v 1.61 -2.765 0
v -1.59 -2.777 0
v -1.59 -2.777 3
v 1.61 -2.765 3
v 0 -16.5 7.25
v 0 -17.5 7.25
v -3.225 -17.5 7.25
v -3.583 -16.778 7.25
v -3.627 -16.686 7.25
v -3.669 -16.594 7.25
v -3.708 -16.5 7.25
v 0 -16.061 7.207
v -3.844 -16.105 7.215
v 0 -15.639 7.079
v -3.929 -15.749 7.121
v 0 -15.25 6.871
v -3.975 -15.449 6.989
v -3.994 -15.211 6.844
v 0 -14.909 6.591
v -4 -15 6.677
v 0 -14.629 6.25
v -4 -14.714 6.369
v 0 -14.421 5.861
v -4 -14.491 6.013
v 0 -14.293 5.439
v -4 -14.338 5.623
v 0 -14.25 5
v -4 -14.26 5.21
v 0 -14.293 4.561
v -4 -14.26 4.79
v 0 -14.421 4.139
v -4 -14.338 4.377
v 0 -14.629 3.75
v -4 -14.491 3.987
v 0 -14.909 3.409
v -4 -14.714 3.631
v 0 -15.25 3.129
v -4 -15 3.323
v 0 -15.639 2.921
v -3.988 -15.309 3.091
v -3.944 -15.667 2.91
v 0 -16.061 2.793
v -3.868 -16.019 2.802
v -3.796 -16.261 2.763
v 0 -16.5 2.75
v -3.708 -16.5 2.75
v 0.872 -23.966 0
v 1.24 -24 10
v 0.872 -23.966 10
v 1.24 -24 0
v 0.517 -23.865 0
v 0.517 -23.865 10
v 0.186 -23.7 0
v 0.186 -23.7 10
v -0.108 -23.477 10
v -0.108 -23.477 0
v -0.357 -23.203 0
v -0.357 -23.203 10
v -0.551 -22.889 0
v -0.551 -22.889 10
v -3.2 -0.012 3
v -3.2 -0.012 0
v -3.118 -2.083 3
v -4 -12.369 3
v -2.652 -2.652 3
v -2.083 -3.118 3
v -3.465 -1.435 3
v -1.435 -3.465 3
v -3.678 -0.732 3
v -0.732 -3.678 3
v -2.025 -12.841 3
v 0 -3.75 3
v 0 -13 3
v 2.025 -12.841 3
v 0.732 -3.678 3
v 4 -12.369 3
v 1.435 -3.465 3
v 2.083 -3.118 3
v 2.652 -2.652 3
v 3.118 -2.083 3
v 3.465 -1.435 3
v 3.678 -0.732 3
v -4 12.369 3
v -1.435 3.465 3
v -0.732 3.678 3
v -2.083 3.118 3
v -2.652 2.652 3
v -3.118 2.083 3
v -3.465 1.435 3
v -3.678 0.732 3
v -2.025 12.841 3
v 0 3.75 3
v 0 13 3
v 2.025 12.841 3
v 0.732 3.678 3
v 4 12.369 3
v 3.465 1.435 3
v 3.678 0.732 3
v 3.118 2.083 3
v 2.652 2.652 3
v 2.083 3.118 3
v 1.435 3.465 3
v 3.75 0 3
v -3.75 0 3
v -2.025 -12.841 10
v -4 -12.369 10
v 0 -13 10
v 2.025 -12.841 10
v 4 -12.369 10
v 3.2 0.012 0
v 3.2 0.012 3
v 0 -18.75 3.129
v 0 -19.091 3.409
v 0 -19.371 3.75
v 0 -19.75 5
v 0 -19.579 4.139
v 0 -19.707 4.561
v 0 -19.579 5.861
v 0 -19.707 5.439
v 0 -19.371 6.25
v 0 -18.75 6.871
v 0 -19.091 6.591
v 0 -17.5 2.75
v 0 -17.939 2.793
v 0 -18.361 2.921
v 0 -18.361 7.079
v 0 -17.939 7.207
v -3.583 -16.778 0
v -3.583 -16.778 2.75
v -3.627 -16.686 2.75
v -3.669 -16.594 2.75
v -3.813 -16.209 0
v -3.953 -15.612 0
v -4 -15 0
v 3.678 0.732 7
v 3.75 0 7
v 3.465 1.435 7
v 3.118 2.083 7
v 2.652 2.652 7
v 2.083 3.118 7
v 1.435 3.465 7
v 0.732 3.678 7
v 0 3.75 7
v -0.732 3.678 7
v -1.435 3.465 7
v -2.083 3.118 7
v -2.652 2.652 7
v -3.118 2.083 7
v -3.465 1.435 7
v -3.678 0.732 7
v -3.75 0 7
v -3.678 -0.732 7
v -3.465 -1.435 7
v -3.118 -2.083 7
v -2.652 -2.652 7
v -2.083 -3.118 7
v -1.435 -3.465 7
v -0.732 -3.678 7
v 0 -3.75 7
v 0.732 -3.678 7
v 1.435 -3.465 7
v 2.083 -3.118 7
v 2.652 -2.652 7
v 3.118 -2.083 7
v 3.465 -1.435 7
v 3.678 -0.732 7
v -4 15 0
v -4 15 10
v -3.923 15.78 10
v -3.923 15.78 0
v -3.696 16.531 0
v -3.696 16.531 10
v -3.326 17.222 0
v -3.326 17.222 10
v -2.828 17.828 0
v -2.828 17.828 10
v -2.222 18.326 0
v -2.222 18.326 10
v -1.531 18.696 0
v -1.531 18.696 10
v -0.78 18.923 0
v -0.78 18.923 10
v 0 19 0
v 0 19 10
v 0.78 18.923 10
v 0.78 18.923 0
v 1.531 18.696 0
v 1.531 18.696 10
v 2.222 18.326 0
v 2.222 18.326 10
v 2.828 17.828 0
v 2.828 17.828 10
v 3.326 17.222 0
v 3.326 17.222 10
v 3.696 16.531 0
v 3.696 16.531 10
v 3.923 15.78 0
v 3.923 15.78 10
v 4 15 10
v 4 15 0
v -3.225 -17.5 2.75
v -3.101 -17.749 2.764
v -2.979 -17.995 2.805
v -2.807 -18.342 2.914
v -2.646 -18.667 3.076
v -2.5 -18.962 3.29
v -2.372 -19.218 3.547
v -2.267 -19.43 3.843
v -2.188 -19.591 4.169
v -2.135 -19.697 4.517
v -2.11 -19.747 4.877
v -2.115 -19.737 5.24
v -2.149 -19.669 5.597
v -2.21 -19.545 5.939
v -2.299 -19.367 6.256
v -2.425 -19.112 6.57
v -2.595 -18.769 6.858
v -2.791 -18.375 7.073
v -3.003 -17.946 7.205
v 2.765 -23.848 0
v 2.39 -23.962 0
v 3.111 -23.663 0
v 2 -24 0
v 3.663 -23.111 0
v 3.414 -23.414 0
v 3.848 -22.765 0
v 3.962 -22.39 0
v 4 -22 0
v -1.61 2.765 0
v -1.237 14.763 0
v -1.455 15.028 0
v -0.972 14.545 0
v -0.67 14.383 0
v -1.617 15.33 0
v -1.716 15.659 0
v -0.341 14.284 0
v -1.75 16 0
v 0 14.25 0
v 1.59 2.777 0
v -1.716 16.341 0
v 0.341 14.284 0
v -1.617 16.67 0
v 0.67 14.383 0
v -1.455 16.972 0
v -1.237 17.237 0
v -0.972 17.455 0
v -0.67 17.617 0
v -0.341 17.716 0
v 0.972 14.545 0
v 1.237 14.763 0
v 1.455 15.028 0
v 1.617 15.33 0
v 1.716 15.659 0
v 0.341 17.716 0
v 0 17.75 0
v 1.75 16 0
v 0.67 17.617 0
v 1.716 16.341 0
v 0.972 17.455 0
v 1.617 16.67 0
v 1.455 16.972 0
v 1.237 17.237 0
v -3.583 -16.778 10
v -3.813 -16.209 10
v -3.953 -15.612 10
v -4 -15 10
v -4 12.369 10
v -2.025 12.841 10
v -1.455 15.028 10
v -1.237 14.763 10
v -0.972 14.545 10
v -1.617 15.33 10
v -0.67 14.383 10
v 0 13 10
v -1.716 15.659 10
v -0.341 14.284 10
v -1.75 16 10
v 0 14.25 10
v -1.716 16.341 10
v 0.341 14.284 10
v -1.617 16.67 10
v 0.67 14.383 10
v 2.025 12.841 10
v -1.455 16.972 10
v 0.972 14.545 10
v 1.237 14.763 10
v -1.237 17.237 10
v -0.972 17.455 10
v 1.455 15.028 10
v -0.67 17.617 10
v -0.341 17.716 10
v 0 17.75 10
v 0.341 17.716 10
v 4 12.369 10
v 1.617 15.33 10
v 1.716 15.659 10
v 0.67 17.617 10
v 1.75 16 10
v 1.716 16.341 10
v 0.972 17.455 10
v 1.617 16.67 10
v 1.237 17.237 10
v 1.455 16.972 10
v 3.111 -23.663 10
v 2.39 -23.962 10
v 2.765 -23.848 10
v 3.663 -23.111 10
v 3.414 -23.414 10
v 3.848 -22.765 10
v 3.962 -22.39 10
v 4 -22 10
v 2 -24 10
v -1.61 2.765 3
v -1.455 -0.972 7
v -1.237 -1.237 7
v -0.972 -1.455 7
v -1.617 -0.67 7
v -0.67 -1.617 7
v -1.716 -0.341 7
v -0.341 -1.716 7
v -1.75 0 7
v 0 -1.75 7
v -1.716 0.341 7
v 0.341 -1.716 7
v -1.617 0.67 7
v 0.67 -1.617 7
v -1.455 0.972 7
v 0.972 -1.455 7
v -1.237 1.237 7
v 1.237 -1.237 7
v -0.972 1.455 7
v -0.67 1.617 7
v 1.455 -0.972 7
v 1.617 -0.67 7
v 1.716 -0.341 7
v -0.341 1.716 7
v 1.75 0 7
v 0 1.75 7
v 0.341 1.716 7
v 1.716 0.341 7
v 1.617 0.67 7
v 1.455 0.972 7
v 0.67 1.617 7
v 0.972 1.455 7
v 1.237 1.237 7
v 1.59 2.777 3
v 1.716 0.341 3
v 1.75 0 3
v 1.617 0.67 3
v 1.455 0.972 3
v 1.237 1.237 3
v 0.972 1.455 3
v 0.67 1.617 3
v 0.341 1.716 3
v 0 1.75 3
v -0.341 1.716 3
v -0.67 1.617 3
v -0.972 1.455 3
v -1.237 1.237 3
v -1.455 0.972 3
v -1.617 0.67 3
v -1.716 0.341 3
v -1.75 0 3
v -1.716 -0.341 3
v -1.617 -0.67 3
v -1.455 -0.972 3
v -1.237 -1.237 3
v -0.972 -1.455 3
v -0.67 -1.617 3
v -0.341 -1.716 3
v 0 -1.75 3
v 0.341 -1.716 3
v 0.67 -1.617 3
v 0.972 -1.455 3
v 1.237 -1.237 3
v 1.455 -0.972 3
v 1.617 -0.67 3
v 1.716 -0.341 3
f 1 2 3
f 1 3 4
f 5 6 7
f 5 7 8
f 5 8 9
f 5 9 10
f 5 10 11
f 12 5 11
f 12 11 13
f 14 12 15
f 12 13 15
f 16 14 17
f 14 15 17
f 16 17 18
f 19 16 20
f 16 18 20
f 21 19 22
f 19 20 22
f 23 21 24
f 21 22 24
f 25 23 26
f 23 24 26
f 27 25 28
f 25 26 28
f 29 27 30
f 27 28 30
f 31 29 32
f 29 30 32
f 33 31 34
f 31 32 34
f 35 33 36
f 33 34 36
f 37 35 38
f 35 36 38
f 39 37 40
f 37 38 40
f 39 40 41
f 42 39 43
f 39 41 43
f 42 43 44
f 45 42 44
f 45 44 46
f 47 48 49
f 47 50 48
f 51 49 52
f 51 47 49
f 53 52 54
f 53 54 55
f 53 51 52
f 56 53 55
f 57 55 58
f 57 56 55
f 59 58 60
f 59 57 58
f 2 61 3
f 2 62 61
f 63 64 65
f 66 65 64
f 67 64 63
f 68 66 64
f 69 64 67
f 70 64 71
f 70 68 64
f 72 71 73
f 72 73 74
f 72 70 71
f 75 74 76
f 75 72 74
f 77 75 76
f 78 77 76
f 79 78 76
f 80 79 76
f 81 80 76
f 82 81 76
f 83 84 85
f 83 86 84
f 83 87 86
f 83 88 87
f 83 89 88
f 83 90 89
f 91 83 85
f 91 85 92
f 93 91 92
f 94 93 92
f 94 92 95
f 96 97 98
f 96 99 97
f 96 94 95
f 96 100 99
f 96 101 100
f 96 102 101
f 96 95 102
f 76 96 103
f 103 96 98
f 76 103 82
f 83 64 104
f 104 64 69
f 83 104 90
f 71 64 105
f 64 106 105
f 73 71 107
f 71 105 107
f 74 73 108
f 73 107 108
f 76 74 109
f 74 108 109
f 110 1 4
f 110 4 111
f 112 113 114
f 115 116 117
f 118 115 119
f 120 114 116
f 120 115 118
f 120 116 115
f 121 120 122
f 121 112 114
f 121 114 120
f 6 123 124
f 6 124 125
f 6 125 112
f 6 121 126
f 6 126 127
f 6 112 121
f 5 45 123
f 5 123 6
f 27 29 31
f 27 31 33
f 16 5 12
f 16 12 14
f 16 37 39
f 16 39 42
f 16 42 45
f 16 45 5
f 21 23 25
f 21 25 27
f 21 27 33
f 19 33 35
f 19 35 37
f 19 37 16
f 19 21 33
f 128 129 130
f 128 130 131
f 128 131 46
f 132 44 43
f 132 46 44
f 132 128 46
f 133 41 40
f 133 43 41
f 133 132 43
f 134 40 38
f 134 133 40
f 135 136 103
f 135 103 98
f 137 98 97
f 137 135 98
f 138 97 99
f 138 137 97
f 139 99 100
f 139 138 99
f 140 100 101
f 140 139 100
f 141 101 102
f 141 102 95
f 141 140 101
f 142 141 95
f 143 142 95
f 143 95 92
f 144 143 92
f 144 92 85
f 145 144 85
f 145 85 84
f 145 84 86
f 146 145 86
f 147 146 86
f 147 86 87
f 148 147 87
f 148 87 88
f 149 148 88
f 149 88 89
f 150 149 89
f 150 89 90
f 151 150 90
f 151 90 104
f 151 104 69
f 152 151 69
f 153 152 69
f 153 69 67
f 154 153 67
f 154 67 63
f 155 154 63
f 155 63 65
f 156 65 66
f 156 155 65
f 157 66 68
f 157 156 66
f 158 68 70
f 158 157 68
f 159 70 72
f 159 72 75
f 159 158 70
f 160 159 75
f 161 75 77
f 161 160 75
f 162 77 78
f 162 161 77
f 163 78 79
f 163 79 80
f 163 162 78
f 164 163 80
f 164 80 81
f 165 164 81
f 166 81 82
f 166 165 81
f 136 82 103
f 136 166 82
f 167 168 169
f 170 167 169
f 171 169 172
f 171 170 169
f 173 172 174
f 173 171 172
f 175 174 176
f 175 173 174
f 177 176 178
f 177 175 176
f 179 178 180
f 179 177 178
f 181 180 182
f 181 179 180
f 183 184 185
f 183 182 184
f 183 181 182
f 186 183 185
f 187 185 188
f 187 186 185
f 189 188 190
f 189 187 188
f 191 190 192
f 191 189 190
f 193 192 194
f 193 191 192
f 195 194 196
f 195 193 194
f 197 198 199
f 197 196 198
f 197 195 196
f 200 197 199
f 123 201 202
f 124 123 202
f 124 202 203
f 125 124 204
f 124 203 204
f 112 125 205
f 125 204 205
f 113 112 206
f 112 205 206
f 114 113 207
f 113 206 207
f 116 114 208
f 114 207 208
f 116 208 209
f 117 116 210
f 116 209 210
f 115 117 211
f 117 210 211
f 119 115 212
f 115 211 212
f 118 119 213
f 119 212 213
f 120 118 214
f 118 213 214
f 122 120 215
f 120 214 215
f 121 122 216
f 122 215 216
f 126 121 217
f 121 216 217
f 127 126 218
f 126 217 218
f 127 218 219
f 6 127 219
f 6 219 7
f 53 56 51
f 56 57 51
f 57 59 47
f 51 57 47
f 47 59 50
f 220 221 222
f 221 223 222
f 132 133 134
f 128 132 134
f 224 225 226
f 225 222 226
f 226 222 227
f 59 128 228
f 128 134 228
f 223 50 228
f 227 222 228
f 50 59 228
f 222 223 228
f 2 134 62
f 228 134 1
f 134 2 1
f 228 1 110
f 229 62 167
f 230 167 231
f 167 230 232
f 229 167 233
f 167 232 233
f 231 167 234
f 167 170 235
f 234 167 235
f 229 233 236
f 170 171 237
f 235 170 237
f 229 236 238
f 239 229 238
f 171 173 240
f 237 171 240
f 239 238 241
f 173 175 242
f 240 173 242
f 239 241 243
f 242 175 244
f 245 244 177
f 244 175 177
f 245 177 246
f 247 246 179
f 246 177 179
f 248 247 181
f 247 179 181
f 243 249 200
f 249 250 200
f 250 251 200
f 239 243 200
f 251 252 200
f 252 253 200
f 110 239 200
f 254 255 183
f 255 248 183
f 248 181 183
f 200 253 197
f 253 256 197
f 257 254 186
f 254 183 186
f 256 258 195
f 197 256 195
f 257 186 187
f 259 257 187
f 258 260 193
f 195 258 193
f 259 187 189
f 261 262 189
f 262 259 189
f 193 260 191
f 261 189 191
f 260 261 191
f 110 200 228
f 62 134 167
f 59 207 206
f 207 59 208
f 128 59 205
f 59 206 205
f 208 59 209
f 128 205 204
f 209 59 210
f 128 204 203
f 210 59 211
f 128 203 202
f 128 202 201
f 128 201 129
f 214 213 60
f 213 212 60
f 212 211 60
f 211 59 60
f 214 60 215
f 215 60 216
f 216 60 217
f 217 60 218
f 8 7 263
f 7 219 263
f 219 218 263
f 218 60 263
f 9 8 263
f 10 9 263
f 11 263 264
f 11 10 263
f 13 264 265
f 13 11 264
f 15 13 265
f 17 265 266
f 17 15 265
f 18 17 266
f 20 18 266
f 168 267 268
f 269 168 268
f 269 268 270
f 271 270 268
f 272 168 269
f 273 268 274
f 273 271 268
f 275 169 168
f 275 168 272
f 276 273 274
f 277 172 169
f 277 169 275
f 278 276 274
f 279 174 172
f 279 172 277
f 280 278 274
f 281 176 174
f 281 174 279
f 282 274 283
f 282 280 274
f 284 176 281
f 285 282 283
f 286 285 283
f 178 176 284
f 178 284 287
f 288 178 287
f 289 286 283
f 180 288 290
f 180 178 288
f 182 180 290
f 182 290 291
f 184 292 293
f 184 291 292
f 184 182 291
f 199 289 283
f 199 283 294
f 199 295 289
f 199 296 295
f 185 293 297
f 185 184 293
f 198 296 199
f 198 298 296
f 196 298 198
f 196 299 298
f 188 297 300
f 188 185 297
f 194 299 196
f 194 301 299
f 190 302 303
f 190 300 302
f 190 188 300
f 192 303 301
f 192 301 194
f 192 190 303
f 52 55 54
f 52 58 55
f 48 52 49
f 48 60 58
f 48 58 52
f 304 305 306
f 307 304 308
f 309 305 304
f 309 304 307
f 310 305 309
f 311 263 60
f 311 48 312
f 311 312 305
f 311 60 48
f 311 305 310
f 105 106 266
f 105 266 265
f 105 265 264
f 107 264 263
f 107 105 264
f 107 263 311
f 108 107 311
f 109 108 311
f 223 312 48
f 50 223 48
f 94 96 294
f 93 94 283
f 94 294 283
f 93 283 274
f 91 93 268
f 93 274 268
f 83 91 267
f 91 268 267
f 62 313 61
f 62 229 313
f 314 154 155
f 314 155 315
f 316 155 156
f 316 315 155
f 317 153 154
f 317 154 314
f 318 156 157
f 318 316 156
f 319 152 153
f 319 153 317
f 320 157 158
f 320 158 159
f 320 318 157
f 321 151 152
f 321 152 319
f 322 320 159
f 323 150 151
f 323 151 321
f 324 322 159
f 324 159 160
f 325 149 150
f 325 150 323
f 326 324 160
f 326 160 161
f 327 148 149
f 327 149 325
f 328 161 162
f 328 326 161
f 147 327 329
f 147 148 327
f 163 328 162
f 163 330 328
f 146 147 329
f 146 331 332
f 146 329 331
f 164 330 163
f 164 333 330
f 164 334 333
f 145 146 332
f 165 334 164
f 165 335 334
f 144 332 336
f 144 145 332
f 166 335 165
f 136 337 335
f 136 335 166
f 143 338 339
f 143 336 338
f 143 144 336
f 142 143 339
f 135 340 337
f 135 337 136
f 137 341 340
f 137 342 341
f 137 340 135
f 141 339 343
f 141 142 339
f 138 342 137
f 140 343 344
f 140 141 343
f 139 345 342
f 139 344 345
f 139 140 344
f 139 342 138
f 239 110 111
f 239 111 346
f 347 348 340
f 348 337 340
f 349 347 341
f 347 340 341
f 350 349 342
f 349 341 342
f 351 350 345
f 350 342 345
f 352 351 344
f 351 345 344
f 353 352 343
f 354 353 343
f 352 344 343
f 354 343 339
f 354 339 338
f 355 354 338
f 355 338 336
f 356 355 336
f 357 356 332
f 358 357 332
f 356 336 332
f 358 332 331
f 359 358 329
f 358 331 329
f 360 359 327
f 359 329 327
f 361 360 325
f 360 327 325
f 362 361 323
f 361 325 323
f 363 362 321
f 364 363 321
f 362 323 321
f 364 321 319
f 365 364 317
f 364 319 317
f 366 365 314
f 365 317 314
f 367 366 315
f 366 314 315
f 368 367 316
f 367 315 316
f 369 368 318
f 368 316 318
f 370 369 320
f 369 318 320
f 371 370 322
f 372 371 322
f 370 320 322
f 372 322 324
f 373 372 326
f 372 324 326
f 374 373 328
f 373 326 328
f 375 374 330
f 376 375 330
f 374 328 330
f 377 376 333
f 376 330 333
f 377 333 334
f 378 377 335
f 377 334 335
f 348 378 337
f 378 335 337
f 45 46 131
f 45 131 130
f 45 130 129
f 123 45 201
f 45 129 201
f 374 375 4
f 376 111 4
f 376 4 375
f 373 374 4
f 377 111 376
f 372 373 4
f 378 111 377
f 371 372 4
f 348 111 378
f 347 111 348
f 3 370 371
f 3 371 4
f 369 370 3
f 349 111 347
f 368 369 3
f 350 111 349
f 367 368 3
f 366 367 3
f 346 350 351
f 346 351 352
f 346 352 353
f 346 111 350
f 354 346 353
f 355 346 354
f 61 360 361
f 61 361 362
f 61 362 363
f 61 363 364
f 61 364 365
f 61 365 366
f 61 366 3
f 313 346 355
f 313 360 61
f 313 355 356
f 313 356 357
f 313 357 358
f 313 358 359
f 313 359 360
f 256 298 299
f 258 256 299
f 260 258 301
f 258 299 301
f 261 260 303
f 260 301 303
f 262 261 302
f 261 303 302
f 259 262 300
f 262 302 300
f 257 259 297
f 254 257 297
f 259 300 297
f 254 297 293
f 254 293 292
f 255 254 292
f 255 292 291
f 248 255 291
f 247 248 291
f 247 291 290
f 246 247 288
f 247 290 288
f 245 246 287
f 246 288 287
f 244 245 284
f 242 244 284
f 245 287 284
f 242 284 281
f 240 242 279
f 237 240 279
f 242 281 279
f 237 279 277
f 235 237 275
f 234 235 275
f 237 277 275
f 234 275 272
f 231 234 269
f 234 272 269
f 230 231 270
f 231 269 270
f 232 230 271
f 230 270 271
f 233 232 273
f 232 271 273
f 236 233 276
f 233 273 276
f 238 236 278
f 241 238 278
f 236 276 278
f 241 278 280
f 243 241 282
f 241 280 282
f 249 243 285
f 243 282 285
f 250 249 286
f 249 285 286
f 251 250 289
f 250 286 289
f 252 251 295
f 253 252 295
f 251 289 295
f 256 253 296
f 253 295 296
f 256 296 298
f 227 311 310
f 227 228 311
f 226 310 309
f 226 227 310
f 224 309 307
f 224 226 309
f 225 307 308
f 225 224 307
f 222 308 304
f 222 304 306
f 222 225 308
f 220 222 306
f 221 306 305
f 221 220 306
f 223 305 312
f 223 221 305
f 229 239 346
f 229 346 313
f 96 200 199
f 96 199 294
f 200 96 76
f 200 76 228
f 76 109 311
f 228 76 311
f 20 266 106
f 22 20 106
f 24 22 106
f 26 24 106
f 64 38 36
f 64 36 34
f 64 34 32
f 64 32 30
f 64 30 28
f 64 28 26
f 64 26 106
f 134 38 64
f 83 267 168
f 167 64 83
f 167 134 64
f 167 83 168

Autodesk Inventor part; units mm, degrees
ref_plane "YZ Plane" through (0, 0, 0) normal (1, 0, 0) x (0, 1, 0)
ref_plane "XZ Plane" through (0, 0, 0) normal (0, 1, 0) x (-1, 0, 0)
ref_plane "XY Plane" through (0, 0, 0) normal (0, 0, 1) x (1, 0, 0)
sketch "Sketch1" plane through (0, 0, 0) normal (0, 0, 1) x (1, 0, 0)
  line L0 (0, -15) -> (0, 15) construction
  line L1 (-4, -15) -> (-4, 15)
  line L2 (4, 15) -> (4, -15)
  arc A0 (-4, -15) -> (0, -19) centre (0, -15) ccw
  arc A1 (4, 15) -> (-4, 15) centre (0, 15) ccw
  line L3 (4, -15) -> (0, -15)
  line L4 (-4, -11) -> (-4, -19)
  line L5 (-4, -19) -> (4, -19)
  line L6 (4, -19) -> (4, -15)
  point P0 (0, 0)
  point P1 (0, 0)
  dimension "d0" = 4
  dimension "d17" = 30
extrude "Extrusion1" add sketch "Sketch1" along normal blind 10 contours L1 A1 L2 L6 L5 A0
sketch "Sketch2" plane through (0, 0, 10) normal (0, 0, 1) x (1, 0, 0)
  line L0 (-4, 15) -> (-4, -15) projected
  arc A0 (-4, -15) -> (0, -19) centre (0, -15) ccw projected
  line L1 (4, -19) -> (4, 15) projected
  arc A1 (4, 15) -> (-4, 15) centre (0, 15) ccw projected
  circle A2 centre (0, 0) radius 13
  circle A3 centre (0, 0) radius 3.75
  line L2 (0, -19) -> (4, -19) projected
  dimension "d3" = 26
  dimension "d4" = 7.5
extrude "Extrusion2" cut sketch "Sketch2" against normal blind 7 contours A2 L1 L0 | L0 A2 | A2 L1
sketch "Sketch3" plane through (0, 0, 10) normal (0, 0, 1) x (1, 0, 0)
  circle A0 centre (0, 0) radius 3.75 projected
  circle A1 centre (0, 0) radius 1.75
  line L0 (-4, -12.3693) -> (-4, -15) projected
  line L1 (4, 12.3693) -> (4, 15) projected
  arc A2 (4, 12.3693) -> (-4, 12.3693) centre (0, 0) ccw projected
  arc A3 (4, 15) -> (-4, 15) centre (0, 15) ccw projected
  arc A4 (-4, -12.3693) -> (4, -12.3693) centre (0, 0) ccw projected
  arc A5 (-4, -15) -> (0, -19) centre (0, -15) ccw projected
  line L2 (0, -19) -> (4, -19) projected
  line L3 (-4, 15) -> (-4, 12.3693) projected
  line L4 (4, -19) -> (4, -12.3693) projected
  dimension "d7" = 3.5
extrude "Extrusion3" cut sketch "Sketch3" against normal through all contours A1
sketch "Sketch4" plane through (0, 0, 0) normal (0, 0, -1) x (-1, 0, 0)
  circle A0 centre (0, 0) radius 1.75 projected
  line L0 (4, -15) -> (4, 15) projected
  arc A1 (4, 15) -> (-4, 15) centre (0, 15) ccw projected
  line L1 (-4, 15) -> (-4, -19) projected
  arc A2 (0, -19) -> (4, -15) centre (0, -15) ccw projected
  circle A3 centre (0, 0) radius 1.75 projected
  line L2 (1.5898, -2.7772) -> (-1.6102, -2.7654)
  line L3 (-1.6102, -2.7654) -> (-3.2, 0.0118)
  line L4 (-3.2, 0.0118) -> (-1.5898, 2.7772)
  line L5 (-1.5898, 2.7772) -> (1.6102, 2.7654)
  line L6 (1.6102, 2.7654) -> (3.2, -0.0118)
  line L7 (3.2, -0.0118) -> (1.5898, -2.7772)
  circle A4 centre (0, 0) radius 3.2
  line L8 (-4, -19) -> (0, -19) projected
  dimension "d10" = 6.4
extrude "Extrusion4" cut sketch "Sketch4" against normal blind 3 contours L2 L3 L4 L5 L6 L7
sketch "Sketch8" plane through (0, 0, 10) normal (0, 0, 1) x (1, 0, 0)
  arc A0 (4, 12.3693) -> (-4, 12.3693) centre (0, 0) ccw projected
  line L0 (4, 12.3693) -> (4, 15) projected
  arc A1 (4, 15) -> (-4, 15) centre (0, 15) ccw projected
  line L1 (-4, 15) -> (-4, 12.3693) projected
  circle A2 centre (0, 16) radius 1.75
  dimension "d28" = 3.5
  dimension "d40" = 1
  dimension "d41" = 5.402
extrude "Extrusion8" cut sketch "Sketch8" against normal through all contours A2
sketch "Sketch10" plane through (0, 0, 10) normal (0, 0, 1) x (1, 0, 0)
  circle A0 centre (0, 0) radius 1.75 projected
  circle A1 centre (0, 0) radius 1.75 projected
  circle A2 centre (0, 0) radius 3.75 projected
extrude "Extrusion10" cut sketch "Sketch10" against normal blind 3
sketch "Sketch12" plane through (0, 0, 10) normal (0, 0, 1) x (1, 0, 0)
  arc A0 (-4, -12.3693) -> (4, -12.3693) centre (0, 0) ccw projected
  line L0 (-4, -12.3693) -> (-4, -15) projected
  arc A1 (-4, -15) -> (0, -19) centre (0, -15) ccw projected
  line L1 (0, -19) -> (4, -19) projected
  line L2 (4, -19) -> (4, -12.3693) projected
  line L3 (4, -19) -> (4, -24)
  line L4 (4, -24) -> (0, -24)
  line L5 (0, -24) -> (-3.5832, -16.7778)
  arc A2 (-4, -15) -> (0, -19) centre (0, -15) ccw projected
  arc A3 (-4, -15) -> (0, -19) centre (0, -15) ccw projected
  line L6 (0, -19) -> (4, -19) projected
  dimension "d42" = 5
extrude "Extrusion11" add sketch "Sketch12" against normal up to surface (10 mm away) from surface at 0 contours L3 L4 L5 A1 L1
sketch "Sketch9" plane through (-4, -15, 0) normal (-1, 0, 0) x (0, 0, 1)
  line L0 (0, 0) -> (10, 0) projected
  line L1 (5, -1.5) -> (5, -2.5) construction
  line L2 (2.75, -1.5) -> (2.75, -2.5)
  line L3 (7.25, -2.5) -> (7.25, -1.5)
  arc A0 (7.25, -1.5) -> (2.75, -1.5) centre (5, -1.5) ccw
  arc A1 (2.75, -2.5) -> (7.25, -2.5) centre (5, -2.5) ccw
  line L4 (3, 2.6307) -> (3, 27.3693) projected
  point P0 (0, 15)
  point P1 (5, -2)
  dimension "d31" = 4.5
  dimension "d34" = 2
  dimension "d45" = 2
extrude "Extrusion9" cut sketch "Sketch9" against normal blind 4
fillet "Fillet4" radius 2 2 edges at (0, -24, 5) (4, -24, 5)
properties part number "rodamiento0.2"
